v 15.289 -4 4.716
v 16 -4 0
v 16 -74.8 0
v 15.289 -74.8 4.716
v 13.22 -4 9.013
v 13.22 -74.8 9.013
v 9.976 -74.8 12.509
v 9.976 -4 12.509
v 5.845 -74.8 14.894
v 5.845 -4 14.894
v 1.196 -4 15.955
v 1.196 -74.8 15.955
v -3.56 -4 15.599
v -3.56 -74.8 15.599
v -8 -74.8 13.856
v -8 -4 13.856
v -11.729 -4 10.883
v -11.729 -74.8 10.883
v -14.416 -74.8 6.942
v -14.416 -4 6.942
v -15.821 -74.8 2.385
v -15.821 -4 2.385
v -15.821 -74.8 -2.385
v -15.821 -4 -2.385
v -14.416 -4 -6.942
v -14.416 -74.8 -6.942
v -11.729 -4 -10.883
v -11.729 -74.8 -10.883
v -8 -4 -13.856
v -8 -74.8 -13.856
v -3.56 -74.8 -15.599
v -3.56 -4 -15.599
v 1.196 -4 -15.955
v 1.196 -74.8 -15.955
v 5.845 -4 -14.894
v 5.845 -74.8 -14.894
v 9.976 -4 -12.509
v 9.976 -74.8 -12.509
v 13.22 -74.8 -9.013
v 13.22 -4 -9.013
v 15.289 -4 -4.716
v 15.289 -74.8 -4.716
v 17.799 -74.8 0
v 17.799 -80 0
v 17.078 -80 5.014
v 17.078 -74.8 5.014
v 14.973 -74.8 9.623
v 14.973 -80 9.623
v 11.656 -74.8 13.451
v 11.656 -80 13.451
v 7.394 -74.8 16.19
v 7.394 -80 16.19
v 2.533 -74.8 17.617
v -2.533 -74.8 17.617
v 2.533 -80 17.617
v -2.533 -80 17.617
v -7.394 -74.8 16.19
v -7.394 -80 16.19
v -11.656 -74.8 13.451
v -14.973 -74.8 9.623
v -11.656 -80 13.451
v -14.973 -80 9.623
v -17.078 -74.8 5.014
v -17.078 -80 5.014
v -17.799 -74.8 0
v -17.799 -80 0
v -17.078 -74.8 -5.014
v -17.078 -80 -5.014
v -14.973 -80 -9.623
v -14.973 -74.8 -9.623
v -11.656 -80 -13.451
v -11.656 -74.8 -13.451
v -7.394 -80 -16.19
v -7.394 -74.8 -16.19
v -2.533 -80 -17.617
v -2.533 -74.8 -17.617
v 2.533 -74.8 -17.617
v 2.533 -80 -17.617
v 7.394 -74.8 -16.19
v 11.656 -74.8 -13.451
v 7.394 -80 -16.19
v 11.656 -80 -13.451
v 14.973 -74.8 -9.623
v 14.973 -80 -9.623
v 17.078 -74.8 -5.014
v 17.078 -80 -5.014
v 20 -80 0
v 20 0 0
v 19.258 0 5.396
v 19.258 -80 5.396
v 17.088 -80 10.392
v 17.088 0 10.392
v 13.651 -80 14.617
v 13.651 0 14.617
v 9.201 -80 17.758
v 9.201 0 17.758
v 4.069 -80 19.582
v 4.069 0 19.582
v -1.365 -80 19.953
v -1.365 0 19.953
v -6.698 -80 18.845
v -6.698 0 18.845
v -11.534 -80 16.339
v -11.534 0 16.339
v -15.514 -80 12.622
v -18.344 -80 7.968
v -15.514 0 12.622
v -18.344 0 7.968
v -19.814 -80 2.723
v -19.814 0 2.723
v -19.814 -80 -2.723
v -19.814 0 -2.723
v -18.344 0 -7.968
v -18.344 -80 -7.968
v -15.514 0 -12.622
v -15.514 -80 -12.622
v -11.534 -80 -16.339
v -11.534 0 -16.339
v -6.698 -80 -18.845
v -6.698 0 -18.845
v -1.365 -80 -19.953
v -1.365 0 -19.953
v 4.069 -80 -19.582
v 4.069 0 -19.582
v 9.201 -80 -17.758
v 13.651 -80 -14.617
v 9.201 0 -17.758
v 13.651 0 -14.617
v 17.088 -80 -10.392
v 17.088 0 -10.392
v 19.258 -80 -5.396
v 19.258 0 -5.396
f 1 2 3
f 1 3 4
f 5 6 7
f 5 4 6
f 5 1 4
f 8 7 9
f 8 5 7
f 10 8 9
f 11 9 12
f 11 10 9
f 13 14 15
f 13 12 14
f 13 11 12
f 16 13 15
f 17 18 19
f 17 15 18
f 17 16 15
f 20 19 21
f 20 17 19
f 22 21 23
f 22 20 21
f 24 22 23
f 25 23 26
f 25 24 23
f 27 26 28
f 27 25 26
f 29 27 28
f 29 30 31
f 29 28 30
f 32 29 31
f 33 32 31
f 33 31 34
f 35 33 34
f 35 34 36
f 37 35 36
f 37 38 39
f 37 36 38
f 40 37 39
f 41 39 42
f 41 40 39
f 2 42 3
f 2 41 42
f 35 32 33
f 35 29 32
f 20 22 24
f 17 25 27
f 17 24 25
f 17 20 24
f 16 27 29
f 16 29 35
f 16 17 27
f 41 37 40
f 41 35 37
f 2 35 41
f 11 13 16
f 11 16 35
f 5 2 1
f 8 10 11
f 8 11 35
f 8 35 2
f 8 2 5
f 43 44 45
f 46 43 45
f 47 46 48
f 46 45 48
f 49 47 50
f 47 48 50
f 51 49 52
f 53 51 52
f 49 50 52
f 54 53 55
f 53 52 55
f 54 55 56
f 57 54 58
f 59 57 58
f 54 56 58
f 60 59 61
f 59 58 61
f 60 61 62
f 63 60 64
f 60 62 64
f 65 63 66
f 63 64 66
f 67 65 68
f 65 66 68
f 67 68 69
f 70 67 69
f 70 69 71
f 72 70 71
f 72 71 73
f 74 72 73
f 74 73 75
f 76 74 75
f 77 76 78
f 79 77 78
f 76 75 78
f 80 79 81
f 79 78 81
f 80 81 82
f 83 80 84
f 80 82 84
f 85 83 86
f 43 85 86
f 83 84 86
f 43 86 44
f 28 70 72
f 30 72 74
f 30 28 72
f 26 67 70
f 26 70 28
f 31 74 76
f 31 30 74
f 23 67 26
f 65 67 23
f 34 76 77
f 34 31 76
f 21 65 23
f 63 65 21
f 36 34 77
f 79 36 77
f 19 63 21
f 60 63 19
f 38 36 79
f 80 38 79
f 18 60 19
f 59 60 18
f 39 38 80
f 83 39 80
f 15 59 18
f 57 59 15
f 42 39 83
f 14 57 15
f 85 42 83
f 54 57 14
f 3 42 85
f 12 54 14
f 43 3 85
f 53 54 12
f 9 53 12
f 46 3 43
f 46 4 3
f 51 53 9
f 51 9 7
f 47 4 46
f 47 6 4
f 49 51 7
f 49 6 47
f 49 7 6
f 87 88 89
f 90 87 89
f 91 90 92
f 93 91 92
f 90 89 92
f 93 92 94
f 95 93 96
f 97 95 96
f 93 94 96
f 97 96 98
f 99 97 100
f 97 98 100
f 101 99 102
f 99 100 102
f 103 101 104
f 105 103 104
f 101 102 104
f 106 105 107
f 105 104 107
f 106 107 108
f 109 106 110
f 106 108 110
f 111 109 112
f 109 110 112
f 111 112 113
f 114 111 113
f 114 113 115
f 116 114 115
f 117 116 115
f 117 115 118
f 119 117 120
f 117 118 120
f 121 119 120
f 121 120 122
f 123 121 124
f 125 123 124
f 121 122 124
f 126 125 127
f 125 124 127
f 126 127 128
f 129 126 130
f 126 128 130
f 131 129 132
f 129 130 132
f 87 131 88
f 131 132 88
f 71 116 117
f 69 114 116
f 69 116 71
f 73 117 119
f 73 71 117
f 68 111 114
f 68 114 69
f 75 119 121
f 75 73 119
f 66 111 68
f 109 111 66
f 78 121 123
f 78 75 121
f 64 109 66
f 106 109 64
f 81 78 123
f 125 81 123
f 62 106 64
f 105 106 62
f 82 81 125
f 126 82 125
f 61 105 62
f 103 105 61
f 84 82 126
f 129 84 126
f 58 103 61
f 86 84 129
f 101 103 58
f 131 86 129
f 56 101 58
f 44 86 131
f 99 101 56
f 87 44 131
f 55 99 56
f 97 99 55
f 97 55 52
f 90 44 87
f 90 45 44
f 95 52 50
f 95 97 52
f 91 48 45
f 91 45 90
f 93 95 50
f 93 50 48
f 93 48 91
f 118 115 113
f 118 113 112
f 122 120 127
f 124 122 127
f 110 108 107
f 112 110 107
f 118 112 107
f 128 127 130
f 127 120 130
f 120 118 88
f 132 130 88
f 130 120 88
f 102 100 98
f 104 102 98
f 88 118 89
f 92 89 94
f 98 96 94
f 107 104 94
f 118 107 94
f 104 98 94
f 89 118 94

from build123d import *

# Parameters (mm, degrees)
F0_R     = 20
F1_DEPTH = 80
F2_T     = -4
F3_R     = 17.798556
F4_DEPTH = 5.2


with BuildPart() as f1:
    # F0 (on Front) → F1 (new body)
    with BuildSketch(Plane.XZ):
        Circle(F0_R)
    extrude(amount=F1_DEPTH)

    # F2
    f2_openings = [f1.faces().sort_by_distance(p)[0] for p in [
        (0, -80, 0),
    ]]
    offset(amount=F2_T, openings=f2_openings)

    # F3 (on face) → F4 (cut)
    with BuildSketch(Plane.XZ.offset(80)):
        Circle(F3_R)
    extrude(amount=-F4_DEPTH, mode=Mode.SUBTRACT)


solid = f1.part
